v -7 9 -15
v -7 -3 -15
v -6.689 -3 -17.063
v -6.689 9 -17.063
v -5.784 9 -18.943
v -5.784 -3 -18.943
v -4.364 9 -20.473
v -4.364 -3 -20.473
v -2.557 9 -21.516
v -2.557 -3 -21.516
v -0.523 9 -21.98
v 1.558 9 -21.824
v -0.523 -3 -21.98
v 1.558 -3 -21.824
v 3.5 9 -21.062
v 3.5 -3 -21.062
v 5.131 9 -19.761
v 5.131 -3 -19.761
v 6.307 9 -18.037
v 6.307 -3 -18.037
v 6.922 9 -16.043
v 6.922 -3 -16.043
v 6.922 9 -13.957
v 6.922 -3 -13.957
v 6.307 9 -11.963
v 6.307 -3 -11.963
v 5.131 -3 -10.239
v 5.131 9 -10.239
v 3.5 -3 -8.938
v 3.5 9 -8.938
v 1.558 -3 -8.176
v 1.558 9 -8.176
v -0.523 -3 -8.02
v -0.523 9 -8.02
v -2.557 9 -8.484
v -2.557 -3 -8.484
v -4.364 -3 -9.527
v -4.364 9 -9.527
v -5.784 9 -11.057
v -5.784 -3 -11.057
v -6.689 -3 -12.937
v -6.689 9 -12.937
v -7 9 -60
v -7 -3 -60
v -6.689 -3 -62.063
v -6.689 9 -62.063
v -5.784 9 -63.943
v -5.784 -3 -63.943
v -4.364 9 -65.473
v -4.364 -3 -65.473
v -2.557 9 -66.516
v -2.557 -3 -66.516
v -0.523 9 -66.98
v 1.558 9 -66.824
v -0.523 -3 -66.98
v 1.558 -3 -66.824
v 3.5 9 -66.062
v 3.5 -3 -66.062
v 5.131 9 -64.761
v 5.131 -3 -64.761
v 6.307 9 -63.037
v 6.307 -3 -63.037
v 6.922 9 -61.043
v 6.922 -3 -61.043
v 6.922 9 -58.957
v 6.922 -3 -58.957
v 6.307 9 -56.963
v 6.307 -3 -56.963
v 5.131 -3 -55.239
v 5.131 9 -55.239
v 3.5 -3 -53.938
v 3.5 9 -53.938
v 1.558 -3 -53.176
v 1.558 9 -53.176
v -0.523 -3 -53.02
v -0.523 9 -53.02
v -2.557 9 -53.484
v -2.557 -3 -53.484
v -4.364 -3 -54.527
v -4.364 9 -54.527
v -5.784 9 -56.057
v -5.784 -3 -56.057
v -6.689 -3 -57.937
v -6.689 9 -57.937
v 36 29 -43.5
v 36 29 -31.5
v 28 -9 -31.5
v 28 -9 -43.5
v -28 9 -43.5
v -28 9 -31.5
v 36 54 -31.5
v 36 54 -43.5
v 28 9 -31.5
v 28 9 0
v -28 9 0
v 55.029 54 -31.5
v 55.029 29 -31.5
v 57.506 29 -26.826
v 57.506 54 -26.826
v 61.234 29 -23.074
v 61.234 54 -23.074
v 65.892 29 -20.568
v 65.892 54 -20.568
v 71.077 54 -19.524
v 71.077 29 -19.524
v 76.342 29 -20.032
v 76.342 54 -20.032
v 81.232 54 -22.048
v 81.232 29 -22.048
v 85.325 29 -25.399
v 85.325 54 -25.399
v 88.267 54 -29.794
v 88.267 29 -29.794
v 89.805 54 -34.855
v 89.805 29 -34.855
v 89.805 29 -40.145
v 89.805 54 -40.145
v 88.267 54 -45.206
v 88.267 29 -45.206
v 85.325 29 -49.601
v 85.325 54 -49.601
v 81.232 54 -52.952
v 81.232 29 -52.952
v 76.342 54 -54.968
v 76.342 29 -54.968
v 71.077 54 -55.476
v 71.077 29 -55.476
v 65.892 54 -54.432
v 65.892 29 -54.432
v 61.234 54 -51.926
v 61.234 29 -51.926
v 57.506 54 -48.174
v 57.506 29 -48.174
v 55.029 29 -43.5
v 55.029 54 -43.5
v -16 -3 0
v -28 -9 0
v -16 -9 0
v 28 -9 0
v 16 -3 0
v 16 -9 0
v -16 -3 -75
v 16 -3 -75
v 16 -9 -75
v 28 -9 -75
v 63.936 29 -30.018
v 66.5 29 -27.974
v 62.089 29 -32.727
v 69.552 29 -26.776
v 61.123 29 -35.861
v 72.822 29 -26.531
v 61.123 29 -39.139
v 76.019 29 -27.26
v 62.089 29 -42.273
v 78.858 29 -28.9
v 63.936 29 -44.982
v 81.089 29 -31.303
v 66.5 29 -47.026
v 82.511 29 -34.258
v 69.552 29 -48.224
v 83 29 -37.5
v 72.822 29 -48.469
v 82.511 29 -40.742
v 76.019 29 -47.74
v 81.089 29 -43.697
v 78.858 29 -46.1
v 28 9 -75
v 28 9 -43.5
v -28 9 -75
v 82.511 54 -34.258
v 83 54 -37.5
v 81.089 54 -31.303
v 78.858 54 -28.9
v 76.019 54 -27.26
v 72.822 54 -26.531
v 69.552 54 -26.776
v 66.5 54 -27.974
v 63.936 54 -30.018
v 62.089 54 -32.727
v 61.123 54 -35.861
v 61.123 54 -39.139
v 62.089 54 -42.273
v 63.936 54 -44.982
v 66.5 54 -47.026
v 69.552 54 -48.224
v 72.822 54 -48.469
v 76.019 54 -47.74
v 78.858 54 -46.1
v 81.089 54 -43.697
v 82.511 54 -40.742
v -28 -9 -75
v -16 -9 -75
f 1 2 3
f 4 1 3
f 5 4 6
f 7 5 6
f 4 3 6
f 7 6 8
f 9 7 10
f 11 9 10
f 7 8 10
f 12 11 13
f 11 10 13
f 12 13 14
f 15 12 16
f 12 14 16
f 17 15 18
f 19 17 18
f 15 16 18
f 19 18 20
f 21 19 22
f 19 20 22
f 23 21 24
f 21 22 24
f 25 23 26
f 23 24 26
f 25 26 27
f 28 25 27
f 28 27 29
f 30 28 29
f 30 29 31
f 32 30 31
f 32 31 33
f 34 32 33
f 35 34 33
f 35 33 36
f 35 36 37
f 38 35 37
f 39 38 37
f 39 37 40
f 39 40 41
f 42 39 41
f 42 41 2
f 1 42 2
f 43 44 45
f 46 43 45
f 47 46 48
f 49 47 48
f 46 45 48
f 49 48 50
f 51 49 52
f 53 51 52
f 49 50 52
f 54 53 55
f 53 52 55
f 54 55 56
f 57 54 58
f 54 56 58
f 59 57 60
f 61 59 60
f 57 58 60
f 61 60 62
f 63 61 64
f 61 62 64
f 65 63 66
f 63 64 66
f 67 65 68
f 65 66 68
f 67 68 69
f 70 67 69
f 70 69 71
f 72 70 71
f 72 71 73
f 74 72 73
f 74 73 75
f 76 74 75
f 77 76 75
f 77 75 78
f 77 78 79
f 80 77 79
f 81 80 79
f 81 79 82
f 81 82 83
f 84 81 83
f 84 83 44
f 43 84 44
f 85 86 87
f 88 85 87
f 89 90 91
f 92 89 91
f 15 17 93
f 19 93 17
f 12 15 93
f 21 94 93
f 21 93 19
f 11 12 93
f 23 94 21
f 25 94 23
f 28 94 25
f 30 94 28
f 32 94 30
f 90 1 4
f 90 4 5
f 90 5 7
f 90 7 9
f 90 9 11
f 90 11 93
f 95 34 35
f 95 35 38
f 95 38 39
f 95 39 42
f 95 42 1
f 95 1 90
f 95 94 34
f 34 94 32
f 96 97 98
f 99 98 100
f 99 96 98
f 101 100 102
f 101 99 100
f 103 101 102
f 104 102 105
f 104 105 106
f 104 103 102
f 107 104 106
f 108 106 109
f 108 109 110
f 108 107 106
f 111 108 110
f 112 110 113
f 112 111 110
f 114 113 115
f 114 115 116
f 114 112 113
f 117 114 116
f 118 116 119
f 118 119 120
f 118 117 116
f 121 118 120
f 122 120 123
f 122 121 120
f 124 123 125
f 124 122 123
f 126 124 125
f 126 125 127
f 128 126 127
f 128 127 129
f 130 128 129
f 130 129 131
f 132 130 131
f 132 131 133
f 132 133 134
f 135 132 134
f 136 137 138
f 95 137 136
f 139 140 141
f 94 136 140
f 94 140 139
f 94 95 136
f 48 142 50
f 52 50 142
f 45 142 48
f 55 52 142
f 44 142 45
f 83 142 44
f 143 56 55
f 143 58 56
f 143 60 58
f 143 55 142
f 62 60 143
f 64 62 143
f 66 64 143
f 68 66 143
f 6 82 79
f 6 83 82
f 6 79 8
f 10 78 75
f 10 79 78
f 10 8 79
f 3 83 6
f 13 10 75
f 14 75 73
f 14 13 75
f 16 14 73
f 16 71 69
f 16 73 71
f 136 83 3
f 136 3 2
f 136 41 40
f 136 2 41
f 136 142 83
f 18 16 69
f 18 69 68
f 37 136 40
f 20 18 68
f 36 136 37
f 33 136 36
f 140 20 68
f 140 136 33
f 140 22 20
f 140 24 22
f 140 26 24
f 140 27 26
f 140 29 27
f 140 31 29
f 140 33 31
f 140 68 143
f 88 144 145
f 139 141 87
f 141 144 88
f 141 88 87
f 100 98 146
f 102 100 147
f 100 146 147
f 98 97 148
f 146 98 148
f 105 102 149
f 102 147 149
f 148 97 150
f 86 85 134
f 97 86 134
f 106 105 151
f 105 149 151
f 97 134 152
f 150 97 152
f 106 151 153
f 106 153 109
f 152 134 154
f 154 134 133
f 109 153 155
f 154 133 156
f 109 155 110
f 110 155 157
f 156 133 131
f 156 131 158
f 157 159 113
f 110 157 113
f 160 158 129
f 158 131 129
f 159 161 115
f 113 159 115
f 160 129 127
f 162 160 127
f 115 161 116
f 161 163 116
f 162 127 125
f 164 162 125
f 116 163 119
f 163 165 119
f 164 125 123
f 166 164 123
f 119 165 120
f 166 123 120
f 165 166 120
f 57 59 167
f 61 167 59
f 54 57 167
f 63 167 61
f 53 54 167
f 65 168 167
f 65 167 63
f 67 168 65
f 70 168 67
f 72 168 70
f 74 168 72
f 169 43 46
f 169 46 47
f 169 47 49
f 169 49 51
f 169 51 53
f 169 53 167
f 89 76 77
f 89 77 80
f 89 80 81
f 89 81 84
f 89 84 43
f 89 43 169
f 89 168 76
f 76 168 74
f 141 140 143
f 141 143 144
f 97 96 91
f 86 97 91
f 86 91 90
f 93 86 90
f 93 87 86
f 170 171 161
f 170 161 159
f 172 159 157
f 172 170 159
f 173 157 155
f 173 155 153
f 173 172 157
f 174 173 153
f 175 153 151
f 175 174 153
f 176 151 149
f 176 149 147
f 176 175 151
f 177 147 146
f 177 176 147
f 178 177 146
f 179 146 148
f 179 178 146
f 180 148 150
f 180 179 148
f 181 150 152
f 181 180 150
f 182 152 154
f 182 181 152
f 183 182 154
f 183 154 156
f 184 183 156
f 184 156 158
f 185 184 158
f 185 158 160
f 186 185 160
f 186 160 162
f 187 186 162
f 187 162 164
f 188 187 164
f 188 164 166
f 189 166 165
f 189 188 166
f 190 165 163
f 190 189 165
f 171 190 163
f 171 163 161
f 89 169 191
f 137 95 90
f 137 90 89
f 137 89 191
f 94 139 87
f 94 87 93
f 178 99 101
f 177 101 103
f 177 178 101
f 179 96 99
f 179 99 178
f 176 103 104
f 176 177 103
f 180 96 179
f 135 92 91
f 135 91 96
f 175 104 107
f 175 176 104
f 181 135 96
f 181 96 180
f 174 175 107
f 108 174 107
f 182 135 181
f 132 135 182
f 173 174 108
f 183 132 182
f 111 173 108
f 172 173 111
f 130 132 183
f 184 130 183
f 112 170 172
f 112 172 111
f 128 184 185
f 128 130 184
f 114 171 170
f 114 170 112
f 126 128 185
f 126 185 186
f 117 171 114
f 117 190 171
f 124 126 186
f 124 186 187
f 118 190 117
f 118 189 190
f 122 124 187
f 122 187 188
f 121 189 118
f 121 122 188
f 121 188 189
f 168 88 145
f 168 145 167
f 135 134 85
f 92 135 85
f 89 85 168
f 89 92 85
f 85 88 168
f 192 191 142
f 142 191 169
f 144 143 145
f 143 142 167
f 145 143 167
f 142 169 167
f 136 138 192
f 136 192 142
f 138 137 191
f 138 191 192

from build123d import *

# Parameters (mm, degrees)
BOSS_EXTRUDE1_DEPTH    = 75
SKETCH9_R              = 11
BOSS_EXTRUDE3_DEPTH    = 25
BOSS_EXTRUDE4_DEPTH    = 6
F_12_0MM_DOWEL_HOLE1_D = 14


with BuildPart() as part:
    # Sketch1 → Boss-Extrude1 (new body)
    with BuildSketch(Plane.XY):
        Polygon((-16, -9), (-16, -3), (16, -3), (16, -9), (28, -9), (28, 9), (-28, 9), (-28, -9), align=None)
    extrude(amount=-BOSS_EXTRUDE1_DEPTH)



with BuildPart() as body_2:
    # Sketch9 → Boss-Extrude3 (new body)
    with BuildSketch(Plane(origin=(0, 54, 0), x_dir=(-1, 0, 0), z_dir=(0, -1, 0))):
        with BuildLine():
            Line((-55.029437252, 43.5), (-36, 43.5))
            Line((-36, 43.5), (-36, 31.5))
            Line((-36, 31.5), (-55.029437252, 31.5))
            ThreePointArc((-55.029437252, 31.5), (-90, 37.5), (-55.029437252, 43.5))
        make_face()
        with Locations(Location((-72, 37.5, 0), (0, 0, 180))):
            Circle(SKETCH9_R, mode=Mode.SUBTRACT)
    extrude(amount=BOSS_EXTRUDE3_DEPTH)


with BuildPart() as part_1:
    add(part.part)

    add(body_2.part)  # Boss-Extrude4 merges body 2
    # Sketch11 → Boss-Extrude4 (add, symmetric)
    with BuildSketch(Plane.XY.offset(-37.5)):
        Polygon((36, 29), (28, -9), (28, 9), (-28, 9), (36, 54), align=None)
    extrude(amount=BOSS_EXTRUDE4_DEPTH, both=True)

    # Ø12.0mm Dowel Hole1 (through all)
    with Locations(Plane(origin=(0, 9, 0), x_dir=(1, 0, 0), z_dir=(0, 1, 0))):
        with Locations((0, 15), (0, 60)):
            Hole(F_12_0MM_DOWEL_HOLE1_D / 2)


solid = part_1.part
